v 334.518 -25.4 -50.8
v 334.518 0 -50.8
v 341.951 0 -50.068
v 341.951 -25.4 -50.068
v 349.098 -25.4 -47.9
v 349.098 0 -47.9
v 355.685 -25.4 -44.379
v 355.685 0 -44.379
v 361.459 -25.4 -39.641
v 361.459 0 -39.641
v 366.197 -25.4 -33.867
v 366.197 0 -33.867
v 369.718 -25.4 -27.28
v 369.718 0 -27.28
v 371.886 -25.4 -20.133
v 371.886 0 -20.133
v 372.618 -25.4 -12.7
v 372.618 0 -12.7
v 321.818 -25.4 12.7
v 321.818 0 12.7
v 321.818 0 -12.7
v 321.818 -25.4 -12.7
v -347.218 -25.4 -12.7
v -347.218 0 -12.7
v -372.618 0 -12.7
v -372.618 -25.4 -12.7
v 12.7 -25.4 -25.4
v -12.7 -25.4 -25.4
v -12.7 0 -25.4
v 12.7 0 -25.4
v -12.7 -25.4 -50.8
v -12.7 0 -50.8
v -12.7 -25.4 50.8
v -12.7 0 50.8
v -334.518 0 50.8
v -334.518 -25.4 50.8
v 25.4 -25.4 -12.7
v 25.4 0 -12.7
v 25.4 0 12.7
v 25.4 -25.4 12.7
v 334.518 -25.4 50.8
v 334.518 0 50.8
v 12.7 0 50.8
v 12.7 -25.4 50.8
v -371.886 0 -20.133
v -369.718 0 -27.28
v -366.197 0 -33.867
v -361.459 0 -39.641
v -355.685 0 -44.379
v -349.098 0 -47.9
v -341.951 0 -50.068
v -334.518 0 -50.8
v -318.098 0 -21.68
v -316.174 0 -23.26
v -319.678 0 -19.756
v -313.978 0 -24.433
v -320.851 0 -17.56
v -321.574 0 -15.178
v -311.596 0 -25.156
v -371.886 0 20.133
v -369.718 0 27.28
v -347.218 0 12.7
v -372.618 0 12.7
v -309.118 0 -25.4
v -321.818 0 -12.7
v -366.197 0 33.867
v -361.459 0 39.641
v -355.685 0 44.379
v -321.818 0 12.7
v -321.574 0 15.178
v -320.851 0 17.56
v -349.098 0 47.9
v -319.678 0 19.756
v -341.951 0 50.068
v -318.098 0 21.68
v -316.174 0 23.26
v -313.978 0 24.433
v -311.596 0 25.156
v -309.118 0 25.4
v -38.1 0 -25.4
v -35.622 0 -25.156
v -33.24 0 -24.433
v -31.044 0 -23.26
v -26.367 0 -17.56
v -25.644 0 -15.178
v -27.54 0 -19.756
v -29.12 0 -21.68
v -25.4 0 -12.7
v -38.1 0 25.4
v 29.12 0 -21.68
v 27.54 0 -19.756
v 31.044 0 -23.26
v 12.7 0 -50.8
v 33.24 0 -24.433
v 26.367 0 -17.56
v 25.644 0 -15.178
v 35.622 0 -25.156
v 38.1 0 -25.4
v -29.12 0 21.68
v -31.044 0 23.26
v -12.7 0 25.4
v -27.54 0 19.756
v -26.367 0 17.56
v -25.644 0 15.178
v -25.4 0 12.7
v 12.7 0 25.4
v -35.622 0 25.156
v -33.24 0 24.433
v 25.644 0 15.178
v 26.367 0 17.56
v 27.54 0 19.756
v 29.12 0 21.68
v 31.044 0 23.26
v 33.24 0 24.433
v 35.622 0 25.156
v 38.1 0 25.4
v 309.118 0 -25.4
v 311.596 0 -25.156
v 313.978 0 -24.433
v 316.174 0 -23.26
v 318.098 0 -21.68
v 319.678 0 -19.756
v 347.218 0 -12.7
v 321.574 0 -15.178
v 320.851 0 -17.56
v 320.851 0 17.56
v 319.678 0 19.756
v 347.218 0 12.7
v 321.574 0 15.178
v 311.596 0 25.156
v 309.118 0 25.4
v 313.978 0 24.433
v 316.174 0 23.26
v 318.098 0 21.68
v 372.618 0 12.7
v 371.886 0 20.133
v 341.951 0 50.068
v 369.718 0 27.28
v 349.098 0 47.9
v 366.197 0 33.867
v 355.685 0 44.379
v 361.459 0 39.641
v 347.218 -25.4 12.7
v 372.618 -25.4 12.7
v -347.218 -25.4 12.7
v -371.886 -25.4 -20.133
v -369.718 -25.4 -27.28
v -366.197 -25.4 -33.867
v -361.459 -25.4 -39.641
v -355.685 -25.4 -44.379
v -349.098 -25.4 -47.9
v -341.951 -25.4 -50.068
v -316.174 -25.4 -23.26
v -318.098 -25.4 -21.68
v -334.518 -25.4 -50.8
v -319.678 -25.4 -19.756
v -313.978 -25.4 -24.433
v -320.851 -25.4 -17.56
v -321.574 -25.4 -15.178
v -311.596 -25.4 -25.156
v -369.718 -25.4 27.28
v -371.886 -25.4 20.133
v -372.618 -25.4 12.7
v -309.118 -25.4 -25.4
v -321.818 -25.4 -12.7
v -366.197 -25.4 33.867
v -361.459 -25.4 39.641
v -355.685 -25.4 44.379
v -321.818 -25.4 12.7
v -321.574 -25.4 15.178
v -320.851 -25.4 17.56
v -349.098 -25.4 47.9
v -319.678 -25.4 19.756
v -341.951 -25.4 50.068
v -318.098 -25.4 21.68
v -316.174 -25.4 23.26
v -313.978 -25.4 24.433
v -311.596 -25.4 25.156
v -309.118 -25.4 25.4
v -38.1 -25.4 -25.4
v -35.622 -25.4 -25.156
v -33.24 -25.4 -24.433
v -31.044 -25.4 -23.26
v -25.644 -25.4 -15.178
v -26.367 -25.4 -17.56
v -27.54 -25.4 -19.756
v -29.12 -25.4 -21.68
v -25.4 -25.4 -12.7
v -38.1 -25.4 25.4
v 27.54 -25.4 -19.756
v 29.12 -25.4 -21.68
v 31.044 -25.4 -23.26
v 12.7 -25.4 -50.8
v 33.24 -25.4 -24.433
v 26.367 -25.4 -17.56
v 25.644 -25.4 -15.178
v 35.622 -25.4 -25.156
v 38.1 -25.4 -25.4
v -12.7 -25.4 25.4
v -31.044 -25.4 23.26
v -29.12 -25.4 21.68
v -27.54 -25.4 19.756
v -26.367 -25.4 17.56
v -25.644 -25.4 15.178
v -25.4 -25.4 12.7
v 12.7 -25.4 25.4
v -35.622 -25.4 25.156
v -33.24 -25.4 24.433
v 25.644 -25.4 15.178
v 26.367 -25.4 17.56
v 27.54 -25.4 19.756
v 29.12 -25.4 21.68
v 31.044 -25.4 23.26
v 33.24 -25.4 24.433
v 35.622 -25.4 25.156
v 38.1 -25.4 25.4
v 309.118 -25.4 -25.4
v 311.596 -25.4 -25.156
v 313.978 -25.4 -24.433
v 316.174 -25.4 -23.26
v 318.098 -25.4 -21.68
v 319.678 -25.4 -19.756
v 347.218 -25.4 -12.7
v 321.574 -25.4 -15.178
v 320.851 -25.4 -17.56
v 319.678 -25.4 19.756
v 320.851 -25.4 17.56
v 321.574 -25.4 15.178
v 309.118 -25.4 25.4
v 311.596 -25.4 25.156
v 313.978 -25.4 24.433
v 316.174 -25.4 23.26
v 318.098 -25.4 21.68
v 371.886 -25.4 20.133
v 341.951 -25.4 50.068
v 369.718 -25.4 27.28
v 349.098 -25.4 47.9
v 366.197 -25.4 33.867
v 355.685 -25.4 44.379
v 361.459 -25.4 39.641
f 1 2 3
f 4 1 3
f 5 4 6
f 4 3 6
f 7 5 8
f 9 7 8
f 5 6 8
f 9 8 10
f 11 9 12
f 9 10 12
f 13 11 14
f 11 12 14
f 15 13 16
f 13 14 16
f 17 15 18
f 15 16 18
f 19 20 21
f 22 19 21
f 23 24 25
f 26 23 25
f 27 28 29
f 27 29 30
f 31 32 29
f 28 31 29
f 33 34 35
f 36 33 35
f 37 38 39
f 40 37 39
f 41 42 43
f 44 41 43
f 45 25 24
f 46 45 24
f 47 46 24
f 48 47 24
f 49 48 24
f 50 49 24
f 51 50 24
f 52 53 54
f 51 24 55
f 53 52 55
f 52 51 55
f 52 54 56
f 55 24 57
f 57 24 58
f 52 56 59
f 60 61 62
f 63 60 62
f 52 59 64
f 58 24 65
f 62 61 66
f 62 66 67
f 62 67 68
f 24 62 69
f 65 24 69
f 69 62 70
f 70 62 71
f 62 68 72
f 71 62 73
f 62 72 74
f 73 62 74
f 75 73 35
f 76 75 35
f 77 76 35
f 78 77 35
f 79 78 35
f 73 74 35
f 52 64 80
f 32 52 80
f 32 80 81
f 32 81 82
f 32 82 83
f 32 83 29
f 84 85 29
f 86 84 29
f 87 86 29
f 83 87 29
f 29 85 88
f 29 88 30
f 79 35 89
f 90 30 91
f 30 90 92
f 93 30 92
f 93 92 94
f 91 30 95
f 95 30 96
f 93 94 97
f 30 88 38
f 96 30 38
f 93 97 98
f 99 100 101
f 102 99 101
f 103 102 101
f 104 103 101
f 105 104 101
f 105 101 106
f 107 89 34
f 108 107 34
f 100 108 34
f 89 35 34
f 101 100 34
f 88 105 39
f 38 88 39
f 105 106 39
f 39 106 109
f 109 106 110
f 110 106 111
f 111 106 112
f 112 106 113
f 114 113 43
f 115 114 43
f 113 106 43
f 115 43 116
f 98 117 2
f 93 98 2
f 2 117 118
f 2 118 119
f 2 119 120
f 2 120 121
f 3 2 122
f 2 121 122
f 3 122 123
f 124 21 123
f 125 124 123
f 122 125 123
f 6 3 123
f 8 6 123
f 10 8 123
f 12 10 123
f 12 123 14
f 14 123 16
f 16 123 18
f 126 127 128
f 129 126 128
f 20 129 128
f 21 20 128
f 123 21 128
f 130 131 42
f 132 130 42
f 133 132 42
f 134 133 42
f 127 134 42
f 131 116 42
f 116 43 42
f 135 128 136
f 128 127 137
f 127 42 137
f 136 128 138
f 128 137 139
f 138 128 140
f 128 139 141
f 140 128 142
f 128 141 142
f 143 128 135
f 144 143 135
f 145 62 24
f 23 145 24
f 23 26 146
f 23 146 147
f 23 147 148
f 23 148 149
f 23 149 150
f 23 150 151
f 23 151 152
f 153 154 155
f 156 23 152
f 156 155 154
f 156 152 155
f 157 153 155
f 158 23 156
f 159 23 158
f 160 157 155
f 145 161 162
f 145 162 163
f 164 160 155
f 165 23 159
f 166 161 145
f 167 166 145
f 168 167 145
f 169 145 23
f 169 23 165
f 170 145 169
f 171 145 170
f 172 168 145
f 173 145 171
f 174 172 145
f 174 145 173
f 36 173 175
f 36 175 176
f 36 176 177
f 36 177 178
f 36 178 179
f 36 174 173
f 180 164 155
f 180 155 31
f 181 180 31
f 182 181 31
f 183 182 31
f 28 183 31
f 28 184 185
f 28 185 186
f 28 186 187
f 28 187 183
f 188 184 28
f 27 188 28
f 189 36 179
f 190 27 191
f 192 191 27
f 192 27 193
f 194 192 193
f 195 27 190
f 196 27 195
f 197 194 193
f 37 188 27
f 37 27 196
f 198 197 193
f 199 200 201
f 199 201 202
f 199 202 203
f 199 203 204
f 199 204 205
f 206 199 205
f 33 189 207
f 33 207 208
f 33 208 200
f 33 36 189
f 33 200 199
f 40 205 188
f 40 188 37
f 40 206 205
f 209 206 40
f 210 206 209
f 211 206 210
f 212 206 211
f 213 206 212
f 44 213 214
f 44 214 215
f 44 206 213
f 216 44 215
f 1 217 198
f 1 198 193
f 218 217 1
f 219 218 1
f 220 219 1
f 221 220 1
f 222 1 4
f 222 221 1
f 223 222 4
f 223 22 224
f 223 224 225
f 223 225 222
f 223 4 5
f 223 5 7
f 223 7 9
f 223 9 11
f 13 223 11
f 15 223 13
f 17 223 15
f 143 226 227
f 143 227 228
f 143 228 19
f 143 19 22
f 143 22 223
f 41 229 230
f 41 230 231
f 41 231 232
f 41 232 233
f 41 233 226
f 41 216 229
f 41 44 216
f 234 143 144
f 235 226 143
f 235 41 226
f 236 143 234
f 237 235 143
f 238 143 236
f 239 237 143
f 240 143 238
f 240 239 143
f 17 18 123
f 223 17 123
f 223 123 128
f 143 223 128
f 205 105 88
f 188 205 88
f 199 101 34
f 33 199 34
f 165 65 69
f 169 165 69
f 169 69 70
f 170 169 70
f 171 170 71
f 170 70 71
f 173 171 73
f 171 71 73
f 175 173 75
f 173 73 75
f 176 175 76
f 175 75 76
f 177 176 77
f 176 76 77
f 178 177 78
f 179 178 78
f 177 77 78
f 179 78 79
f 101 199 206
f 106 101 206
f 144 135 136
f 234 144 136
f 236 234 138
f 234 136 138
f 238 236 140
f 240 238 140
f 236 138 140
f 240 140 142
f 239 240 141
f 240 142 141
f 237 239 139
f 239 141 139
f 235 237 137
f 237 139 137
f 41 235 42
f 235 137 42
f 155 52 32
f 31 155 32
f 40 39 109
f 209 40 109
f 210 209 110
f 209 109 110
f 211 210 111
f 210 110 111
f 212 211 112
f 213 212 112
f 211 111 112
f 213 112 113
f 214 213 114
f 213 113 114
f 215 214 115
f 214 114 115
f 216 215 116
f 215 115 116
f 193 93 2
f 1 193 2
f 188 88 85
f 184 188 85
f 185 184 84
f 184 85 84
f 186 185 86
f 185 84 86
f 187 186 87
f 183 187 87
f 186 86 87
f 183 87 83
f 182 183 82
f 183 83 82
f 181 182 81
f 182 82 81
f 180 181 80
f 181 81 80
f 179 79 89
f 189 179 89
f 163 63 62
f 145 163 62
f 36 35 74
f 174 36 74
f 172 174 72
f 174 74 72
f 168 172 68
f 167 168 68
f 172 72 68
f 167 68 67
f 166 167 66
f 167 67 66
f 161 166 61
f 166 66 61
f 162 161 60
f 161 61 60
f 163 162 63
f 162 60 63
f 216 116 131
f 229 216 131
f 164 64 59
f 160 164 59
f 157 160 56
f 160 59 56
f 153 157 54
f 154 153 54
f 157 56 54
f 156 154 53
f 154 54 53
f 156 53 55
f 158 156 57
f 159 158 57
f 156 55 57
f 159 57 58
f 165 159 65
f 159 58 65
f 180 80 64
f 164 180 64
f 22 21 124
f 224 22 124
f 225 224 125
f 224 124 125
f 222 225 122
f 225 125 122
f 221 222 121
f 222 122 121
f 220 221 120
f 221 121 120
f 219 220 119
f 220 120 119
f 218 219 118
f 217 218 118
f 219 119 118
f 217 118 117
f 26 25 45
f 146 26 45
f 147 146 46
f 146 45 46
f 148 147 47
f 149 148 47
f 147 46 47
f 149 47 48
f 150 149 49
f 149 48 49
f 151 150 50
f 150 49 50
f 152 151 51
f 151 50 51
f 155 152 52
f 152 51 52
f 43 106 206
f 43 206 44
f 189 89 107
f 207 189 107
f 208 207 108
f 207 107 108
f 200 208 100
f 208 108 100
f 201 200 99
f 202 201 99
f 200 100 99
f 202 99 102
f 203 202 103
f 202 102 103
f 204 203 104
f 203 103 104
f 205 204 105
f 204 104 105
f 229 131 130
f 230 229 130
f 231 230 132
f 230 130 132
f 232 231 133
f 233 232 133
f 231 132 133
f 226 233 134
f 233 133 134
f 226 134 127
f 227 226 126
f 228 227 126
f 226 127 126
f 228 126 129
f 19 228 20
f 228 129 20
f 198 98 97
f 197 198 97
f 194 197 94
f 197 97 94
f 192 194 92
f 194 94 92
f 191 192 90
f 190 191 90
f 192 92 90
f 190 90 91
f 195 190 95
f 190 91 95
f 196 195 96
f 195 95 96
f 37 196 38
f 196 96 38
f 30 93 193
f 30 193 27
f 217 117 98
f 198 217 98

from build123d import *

# Parameters (mm, degrees)
F1_DEPTH = 25.4
F2_W     = 25.4
F2_H     = 25.4
F3_DEPTH = 25.4


with BuildPart() as f1:
    # F0 (on Front) → F1 (new body)
    with BuildSketch(Plane.XZ):
        with BuildLine():
            Line((-372.618, 12.7), (-347.218, 12.7))
            Line((-347.218, 12.7), (-347.218, -12.7))
            Line((-347.218, -12.7), (-372.618, -12.7))
            ThreePointArc((-372.618, -12.7), (-361.458768, -39.640768), (-334.518, -50.8))
            Line((-334.518, -50.8), (0, -50.8))
            Line((0, -50.8), (334.518, -50.8))
            ThreePointArc((334.518, -50.8), (361.458768, -39.640768), (372.618, -12.7))
            Line((372.618, -12.7), (347.218, -12.7))
            Line((347.218, -12.7), (347.218, 12.7))
            Line((347.218, 12.7), (372.618, 12.7))
            ThreePointArc((372.618, 12.7), (361.458768, 39.640768), (334.518, 50.8))
            Line((334.518, 50.8), (0, 50.8))
            Line((0, 50.8), (-334.518, 50.8))
            ThreePointArc((-334.518, 50.8), (-361.458768, 39.640768), (-372.618, 12.7))
        make_face()
        with BuildLine():
            Line((-38.1, -25.4), (-309.118, -25.4))
            ThreePointArc((-309.118, -25.4), (-318.098256, -21.680256), (-321.818, -12.7))
            Line((-321.818, -12.7), (-321.818, 12.7))
            ThreePointArc((-321.818, 12.7), (-318.098256, 21.680256), (-309.118, 25.4))
            Line((-309.118, 25.4), (-38.1, 25.4))
            ThreePointArc((-38.1, 25.4), (-29.119744, 21.680256), (-25.4, 12.7))
            Line((-25.4, 12.7), (-25.4, -12.7))
            ThreePointArc((-25.4, -12.7), (-29.119744, -21.680256), (-38.1, -25.4))
        make_face(mode=Mode.SUBTRACT)
        with BuildLine():
            Line((321.818, 12.7), (321.818, -12.7))
            ThreePointArc((321.818, -12.7), (318.098256, -21.680256), (309.118, -25.4))
            Line((309.118, -25.4), (38.1, -25.4))
            ThreePointArc((38.1, -25.4), (29.119744, -21.680256), (25.4, -12.7))
            Line((25.4, -12.7), (25.4, 12.7))
            ThreePointArc((25.4, 12.7), (29.119744, 21.680256), (38.1, 25.4))
            Line((38.1, 25.4), (309.118, 25.4))
            ThreePointArc((309.118, 25.4), (318.098256, 21.680256), (321.818, 12.7))
        make_face(mode=Mode.SUBTRACT)
    extrude(amount=F1_DEPTH)

    # F2 (on face) → F3 (cut)
    with BuildSketch(Plane.XZ.offset(25.4)):
        with Locations((0, 38.1)):
            Rectangle(F2_W, F2_H)
        with Locations((0, -38.1)):
            Rectangle(F2_W, F2_H)
    extrude(amount=-F3_DEPTH, mode=Mode.SUBTRACT)


solid = f1.part
